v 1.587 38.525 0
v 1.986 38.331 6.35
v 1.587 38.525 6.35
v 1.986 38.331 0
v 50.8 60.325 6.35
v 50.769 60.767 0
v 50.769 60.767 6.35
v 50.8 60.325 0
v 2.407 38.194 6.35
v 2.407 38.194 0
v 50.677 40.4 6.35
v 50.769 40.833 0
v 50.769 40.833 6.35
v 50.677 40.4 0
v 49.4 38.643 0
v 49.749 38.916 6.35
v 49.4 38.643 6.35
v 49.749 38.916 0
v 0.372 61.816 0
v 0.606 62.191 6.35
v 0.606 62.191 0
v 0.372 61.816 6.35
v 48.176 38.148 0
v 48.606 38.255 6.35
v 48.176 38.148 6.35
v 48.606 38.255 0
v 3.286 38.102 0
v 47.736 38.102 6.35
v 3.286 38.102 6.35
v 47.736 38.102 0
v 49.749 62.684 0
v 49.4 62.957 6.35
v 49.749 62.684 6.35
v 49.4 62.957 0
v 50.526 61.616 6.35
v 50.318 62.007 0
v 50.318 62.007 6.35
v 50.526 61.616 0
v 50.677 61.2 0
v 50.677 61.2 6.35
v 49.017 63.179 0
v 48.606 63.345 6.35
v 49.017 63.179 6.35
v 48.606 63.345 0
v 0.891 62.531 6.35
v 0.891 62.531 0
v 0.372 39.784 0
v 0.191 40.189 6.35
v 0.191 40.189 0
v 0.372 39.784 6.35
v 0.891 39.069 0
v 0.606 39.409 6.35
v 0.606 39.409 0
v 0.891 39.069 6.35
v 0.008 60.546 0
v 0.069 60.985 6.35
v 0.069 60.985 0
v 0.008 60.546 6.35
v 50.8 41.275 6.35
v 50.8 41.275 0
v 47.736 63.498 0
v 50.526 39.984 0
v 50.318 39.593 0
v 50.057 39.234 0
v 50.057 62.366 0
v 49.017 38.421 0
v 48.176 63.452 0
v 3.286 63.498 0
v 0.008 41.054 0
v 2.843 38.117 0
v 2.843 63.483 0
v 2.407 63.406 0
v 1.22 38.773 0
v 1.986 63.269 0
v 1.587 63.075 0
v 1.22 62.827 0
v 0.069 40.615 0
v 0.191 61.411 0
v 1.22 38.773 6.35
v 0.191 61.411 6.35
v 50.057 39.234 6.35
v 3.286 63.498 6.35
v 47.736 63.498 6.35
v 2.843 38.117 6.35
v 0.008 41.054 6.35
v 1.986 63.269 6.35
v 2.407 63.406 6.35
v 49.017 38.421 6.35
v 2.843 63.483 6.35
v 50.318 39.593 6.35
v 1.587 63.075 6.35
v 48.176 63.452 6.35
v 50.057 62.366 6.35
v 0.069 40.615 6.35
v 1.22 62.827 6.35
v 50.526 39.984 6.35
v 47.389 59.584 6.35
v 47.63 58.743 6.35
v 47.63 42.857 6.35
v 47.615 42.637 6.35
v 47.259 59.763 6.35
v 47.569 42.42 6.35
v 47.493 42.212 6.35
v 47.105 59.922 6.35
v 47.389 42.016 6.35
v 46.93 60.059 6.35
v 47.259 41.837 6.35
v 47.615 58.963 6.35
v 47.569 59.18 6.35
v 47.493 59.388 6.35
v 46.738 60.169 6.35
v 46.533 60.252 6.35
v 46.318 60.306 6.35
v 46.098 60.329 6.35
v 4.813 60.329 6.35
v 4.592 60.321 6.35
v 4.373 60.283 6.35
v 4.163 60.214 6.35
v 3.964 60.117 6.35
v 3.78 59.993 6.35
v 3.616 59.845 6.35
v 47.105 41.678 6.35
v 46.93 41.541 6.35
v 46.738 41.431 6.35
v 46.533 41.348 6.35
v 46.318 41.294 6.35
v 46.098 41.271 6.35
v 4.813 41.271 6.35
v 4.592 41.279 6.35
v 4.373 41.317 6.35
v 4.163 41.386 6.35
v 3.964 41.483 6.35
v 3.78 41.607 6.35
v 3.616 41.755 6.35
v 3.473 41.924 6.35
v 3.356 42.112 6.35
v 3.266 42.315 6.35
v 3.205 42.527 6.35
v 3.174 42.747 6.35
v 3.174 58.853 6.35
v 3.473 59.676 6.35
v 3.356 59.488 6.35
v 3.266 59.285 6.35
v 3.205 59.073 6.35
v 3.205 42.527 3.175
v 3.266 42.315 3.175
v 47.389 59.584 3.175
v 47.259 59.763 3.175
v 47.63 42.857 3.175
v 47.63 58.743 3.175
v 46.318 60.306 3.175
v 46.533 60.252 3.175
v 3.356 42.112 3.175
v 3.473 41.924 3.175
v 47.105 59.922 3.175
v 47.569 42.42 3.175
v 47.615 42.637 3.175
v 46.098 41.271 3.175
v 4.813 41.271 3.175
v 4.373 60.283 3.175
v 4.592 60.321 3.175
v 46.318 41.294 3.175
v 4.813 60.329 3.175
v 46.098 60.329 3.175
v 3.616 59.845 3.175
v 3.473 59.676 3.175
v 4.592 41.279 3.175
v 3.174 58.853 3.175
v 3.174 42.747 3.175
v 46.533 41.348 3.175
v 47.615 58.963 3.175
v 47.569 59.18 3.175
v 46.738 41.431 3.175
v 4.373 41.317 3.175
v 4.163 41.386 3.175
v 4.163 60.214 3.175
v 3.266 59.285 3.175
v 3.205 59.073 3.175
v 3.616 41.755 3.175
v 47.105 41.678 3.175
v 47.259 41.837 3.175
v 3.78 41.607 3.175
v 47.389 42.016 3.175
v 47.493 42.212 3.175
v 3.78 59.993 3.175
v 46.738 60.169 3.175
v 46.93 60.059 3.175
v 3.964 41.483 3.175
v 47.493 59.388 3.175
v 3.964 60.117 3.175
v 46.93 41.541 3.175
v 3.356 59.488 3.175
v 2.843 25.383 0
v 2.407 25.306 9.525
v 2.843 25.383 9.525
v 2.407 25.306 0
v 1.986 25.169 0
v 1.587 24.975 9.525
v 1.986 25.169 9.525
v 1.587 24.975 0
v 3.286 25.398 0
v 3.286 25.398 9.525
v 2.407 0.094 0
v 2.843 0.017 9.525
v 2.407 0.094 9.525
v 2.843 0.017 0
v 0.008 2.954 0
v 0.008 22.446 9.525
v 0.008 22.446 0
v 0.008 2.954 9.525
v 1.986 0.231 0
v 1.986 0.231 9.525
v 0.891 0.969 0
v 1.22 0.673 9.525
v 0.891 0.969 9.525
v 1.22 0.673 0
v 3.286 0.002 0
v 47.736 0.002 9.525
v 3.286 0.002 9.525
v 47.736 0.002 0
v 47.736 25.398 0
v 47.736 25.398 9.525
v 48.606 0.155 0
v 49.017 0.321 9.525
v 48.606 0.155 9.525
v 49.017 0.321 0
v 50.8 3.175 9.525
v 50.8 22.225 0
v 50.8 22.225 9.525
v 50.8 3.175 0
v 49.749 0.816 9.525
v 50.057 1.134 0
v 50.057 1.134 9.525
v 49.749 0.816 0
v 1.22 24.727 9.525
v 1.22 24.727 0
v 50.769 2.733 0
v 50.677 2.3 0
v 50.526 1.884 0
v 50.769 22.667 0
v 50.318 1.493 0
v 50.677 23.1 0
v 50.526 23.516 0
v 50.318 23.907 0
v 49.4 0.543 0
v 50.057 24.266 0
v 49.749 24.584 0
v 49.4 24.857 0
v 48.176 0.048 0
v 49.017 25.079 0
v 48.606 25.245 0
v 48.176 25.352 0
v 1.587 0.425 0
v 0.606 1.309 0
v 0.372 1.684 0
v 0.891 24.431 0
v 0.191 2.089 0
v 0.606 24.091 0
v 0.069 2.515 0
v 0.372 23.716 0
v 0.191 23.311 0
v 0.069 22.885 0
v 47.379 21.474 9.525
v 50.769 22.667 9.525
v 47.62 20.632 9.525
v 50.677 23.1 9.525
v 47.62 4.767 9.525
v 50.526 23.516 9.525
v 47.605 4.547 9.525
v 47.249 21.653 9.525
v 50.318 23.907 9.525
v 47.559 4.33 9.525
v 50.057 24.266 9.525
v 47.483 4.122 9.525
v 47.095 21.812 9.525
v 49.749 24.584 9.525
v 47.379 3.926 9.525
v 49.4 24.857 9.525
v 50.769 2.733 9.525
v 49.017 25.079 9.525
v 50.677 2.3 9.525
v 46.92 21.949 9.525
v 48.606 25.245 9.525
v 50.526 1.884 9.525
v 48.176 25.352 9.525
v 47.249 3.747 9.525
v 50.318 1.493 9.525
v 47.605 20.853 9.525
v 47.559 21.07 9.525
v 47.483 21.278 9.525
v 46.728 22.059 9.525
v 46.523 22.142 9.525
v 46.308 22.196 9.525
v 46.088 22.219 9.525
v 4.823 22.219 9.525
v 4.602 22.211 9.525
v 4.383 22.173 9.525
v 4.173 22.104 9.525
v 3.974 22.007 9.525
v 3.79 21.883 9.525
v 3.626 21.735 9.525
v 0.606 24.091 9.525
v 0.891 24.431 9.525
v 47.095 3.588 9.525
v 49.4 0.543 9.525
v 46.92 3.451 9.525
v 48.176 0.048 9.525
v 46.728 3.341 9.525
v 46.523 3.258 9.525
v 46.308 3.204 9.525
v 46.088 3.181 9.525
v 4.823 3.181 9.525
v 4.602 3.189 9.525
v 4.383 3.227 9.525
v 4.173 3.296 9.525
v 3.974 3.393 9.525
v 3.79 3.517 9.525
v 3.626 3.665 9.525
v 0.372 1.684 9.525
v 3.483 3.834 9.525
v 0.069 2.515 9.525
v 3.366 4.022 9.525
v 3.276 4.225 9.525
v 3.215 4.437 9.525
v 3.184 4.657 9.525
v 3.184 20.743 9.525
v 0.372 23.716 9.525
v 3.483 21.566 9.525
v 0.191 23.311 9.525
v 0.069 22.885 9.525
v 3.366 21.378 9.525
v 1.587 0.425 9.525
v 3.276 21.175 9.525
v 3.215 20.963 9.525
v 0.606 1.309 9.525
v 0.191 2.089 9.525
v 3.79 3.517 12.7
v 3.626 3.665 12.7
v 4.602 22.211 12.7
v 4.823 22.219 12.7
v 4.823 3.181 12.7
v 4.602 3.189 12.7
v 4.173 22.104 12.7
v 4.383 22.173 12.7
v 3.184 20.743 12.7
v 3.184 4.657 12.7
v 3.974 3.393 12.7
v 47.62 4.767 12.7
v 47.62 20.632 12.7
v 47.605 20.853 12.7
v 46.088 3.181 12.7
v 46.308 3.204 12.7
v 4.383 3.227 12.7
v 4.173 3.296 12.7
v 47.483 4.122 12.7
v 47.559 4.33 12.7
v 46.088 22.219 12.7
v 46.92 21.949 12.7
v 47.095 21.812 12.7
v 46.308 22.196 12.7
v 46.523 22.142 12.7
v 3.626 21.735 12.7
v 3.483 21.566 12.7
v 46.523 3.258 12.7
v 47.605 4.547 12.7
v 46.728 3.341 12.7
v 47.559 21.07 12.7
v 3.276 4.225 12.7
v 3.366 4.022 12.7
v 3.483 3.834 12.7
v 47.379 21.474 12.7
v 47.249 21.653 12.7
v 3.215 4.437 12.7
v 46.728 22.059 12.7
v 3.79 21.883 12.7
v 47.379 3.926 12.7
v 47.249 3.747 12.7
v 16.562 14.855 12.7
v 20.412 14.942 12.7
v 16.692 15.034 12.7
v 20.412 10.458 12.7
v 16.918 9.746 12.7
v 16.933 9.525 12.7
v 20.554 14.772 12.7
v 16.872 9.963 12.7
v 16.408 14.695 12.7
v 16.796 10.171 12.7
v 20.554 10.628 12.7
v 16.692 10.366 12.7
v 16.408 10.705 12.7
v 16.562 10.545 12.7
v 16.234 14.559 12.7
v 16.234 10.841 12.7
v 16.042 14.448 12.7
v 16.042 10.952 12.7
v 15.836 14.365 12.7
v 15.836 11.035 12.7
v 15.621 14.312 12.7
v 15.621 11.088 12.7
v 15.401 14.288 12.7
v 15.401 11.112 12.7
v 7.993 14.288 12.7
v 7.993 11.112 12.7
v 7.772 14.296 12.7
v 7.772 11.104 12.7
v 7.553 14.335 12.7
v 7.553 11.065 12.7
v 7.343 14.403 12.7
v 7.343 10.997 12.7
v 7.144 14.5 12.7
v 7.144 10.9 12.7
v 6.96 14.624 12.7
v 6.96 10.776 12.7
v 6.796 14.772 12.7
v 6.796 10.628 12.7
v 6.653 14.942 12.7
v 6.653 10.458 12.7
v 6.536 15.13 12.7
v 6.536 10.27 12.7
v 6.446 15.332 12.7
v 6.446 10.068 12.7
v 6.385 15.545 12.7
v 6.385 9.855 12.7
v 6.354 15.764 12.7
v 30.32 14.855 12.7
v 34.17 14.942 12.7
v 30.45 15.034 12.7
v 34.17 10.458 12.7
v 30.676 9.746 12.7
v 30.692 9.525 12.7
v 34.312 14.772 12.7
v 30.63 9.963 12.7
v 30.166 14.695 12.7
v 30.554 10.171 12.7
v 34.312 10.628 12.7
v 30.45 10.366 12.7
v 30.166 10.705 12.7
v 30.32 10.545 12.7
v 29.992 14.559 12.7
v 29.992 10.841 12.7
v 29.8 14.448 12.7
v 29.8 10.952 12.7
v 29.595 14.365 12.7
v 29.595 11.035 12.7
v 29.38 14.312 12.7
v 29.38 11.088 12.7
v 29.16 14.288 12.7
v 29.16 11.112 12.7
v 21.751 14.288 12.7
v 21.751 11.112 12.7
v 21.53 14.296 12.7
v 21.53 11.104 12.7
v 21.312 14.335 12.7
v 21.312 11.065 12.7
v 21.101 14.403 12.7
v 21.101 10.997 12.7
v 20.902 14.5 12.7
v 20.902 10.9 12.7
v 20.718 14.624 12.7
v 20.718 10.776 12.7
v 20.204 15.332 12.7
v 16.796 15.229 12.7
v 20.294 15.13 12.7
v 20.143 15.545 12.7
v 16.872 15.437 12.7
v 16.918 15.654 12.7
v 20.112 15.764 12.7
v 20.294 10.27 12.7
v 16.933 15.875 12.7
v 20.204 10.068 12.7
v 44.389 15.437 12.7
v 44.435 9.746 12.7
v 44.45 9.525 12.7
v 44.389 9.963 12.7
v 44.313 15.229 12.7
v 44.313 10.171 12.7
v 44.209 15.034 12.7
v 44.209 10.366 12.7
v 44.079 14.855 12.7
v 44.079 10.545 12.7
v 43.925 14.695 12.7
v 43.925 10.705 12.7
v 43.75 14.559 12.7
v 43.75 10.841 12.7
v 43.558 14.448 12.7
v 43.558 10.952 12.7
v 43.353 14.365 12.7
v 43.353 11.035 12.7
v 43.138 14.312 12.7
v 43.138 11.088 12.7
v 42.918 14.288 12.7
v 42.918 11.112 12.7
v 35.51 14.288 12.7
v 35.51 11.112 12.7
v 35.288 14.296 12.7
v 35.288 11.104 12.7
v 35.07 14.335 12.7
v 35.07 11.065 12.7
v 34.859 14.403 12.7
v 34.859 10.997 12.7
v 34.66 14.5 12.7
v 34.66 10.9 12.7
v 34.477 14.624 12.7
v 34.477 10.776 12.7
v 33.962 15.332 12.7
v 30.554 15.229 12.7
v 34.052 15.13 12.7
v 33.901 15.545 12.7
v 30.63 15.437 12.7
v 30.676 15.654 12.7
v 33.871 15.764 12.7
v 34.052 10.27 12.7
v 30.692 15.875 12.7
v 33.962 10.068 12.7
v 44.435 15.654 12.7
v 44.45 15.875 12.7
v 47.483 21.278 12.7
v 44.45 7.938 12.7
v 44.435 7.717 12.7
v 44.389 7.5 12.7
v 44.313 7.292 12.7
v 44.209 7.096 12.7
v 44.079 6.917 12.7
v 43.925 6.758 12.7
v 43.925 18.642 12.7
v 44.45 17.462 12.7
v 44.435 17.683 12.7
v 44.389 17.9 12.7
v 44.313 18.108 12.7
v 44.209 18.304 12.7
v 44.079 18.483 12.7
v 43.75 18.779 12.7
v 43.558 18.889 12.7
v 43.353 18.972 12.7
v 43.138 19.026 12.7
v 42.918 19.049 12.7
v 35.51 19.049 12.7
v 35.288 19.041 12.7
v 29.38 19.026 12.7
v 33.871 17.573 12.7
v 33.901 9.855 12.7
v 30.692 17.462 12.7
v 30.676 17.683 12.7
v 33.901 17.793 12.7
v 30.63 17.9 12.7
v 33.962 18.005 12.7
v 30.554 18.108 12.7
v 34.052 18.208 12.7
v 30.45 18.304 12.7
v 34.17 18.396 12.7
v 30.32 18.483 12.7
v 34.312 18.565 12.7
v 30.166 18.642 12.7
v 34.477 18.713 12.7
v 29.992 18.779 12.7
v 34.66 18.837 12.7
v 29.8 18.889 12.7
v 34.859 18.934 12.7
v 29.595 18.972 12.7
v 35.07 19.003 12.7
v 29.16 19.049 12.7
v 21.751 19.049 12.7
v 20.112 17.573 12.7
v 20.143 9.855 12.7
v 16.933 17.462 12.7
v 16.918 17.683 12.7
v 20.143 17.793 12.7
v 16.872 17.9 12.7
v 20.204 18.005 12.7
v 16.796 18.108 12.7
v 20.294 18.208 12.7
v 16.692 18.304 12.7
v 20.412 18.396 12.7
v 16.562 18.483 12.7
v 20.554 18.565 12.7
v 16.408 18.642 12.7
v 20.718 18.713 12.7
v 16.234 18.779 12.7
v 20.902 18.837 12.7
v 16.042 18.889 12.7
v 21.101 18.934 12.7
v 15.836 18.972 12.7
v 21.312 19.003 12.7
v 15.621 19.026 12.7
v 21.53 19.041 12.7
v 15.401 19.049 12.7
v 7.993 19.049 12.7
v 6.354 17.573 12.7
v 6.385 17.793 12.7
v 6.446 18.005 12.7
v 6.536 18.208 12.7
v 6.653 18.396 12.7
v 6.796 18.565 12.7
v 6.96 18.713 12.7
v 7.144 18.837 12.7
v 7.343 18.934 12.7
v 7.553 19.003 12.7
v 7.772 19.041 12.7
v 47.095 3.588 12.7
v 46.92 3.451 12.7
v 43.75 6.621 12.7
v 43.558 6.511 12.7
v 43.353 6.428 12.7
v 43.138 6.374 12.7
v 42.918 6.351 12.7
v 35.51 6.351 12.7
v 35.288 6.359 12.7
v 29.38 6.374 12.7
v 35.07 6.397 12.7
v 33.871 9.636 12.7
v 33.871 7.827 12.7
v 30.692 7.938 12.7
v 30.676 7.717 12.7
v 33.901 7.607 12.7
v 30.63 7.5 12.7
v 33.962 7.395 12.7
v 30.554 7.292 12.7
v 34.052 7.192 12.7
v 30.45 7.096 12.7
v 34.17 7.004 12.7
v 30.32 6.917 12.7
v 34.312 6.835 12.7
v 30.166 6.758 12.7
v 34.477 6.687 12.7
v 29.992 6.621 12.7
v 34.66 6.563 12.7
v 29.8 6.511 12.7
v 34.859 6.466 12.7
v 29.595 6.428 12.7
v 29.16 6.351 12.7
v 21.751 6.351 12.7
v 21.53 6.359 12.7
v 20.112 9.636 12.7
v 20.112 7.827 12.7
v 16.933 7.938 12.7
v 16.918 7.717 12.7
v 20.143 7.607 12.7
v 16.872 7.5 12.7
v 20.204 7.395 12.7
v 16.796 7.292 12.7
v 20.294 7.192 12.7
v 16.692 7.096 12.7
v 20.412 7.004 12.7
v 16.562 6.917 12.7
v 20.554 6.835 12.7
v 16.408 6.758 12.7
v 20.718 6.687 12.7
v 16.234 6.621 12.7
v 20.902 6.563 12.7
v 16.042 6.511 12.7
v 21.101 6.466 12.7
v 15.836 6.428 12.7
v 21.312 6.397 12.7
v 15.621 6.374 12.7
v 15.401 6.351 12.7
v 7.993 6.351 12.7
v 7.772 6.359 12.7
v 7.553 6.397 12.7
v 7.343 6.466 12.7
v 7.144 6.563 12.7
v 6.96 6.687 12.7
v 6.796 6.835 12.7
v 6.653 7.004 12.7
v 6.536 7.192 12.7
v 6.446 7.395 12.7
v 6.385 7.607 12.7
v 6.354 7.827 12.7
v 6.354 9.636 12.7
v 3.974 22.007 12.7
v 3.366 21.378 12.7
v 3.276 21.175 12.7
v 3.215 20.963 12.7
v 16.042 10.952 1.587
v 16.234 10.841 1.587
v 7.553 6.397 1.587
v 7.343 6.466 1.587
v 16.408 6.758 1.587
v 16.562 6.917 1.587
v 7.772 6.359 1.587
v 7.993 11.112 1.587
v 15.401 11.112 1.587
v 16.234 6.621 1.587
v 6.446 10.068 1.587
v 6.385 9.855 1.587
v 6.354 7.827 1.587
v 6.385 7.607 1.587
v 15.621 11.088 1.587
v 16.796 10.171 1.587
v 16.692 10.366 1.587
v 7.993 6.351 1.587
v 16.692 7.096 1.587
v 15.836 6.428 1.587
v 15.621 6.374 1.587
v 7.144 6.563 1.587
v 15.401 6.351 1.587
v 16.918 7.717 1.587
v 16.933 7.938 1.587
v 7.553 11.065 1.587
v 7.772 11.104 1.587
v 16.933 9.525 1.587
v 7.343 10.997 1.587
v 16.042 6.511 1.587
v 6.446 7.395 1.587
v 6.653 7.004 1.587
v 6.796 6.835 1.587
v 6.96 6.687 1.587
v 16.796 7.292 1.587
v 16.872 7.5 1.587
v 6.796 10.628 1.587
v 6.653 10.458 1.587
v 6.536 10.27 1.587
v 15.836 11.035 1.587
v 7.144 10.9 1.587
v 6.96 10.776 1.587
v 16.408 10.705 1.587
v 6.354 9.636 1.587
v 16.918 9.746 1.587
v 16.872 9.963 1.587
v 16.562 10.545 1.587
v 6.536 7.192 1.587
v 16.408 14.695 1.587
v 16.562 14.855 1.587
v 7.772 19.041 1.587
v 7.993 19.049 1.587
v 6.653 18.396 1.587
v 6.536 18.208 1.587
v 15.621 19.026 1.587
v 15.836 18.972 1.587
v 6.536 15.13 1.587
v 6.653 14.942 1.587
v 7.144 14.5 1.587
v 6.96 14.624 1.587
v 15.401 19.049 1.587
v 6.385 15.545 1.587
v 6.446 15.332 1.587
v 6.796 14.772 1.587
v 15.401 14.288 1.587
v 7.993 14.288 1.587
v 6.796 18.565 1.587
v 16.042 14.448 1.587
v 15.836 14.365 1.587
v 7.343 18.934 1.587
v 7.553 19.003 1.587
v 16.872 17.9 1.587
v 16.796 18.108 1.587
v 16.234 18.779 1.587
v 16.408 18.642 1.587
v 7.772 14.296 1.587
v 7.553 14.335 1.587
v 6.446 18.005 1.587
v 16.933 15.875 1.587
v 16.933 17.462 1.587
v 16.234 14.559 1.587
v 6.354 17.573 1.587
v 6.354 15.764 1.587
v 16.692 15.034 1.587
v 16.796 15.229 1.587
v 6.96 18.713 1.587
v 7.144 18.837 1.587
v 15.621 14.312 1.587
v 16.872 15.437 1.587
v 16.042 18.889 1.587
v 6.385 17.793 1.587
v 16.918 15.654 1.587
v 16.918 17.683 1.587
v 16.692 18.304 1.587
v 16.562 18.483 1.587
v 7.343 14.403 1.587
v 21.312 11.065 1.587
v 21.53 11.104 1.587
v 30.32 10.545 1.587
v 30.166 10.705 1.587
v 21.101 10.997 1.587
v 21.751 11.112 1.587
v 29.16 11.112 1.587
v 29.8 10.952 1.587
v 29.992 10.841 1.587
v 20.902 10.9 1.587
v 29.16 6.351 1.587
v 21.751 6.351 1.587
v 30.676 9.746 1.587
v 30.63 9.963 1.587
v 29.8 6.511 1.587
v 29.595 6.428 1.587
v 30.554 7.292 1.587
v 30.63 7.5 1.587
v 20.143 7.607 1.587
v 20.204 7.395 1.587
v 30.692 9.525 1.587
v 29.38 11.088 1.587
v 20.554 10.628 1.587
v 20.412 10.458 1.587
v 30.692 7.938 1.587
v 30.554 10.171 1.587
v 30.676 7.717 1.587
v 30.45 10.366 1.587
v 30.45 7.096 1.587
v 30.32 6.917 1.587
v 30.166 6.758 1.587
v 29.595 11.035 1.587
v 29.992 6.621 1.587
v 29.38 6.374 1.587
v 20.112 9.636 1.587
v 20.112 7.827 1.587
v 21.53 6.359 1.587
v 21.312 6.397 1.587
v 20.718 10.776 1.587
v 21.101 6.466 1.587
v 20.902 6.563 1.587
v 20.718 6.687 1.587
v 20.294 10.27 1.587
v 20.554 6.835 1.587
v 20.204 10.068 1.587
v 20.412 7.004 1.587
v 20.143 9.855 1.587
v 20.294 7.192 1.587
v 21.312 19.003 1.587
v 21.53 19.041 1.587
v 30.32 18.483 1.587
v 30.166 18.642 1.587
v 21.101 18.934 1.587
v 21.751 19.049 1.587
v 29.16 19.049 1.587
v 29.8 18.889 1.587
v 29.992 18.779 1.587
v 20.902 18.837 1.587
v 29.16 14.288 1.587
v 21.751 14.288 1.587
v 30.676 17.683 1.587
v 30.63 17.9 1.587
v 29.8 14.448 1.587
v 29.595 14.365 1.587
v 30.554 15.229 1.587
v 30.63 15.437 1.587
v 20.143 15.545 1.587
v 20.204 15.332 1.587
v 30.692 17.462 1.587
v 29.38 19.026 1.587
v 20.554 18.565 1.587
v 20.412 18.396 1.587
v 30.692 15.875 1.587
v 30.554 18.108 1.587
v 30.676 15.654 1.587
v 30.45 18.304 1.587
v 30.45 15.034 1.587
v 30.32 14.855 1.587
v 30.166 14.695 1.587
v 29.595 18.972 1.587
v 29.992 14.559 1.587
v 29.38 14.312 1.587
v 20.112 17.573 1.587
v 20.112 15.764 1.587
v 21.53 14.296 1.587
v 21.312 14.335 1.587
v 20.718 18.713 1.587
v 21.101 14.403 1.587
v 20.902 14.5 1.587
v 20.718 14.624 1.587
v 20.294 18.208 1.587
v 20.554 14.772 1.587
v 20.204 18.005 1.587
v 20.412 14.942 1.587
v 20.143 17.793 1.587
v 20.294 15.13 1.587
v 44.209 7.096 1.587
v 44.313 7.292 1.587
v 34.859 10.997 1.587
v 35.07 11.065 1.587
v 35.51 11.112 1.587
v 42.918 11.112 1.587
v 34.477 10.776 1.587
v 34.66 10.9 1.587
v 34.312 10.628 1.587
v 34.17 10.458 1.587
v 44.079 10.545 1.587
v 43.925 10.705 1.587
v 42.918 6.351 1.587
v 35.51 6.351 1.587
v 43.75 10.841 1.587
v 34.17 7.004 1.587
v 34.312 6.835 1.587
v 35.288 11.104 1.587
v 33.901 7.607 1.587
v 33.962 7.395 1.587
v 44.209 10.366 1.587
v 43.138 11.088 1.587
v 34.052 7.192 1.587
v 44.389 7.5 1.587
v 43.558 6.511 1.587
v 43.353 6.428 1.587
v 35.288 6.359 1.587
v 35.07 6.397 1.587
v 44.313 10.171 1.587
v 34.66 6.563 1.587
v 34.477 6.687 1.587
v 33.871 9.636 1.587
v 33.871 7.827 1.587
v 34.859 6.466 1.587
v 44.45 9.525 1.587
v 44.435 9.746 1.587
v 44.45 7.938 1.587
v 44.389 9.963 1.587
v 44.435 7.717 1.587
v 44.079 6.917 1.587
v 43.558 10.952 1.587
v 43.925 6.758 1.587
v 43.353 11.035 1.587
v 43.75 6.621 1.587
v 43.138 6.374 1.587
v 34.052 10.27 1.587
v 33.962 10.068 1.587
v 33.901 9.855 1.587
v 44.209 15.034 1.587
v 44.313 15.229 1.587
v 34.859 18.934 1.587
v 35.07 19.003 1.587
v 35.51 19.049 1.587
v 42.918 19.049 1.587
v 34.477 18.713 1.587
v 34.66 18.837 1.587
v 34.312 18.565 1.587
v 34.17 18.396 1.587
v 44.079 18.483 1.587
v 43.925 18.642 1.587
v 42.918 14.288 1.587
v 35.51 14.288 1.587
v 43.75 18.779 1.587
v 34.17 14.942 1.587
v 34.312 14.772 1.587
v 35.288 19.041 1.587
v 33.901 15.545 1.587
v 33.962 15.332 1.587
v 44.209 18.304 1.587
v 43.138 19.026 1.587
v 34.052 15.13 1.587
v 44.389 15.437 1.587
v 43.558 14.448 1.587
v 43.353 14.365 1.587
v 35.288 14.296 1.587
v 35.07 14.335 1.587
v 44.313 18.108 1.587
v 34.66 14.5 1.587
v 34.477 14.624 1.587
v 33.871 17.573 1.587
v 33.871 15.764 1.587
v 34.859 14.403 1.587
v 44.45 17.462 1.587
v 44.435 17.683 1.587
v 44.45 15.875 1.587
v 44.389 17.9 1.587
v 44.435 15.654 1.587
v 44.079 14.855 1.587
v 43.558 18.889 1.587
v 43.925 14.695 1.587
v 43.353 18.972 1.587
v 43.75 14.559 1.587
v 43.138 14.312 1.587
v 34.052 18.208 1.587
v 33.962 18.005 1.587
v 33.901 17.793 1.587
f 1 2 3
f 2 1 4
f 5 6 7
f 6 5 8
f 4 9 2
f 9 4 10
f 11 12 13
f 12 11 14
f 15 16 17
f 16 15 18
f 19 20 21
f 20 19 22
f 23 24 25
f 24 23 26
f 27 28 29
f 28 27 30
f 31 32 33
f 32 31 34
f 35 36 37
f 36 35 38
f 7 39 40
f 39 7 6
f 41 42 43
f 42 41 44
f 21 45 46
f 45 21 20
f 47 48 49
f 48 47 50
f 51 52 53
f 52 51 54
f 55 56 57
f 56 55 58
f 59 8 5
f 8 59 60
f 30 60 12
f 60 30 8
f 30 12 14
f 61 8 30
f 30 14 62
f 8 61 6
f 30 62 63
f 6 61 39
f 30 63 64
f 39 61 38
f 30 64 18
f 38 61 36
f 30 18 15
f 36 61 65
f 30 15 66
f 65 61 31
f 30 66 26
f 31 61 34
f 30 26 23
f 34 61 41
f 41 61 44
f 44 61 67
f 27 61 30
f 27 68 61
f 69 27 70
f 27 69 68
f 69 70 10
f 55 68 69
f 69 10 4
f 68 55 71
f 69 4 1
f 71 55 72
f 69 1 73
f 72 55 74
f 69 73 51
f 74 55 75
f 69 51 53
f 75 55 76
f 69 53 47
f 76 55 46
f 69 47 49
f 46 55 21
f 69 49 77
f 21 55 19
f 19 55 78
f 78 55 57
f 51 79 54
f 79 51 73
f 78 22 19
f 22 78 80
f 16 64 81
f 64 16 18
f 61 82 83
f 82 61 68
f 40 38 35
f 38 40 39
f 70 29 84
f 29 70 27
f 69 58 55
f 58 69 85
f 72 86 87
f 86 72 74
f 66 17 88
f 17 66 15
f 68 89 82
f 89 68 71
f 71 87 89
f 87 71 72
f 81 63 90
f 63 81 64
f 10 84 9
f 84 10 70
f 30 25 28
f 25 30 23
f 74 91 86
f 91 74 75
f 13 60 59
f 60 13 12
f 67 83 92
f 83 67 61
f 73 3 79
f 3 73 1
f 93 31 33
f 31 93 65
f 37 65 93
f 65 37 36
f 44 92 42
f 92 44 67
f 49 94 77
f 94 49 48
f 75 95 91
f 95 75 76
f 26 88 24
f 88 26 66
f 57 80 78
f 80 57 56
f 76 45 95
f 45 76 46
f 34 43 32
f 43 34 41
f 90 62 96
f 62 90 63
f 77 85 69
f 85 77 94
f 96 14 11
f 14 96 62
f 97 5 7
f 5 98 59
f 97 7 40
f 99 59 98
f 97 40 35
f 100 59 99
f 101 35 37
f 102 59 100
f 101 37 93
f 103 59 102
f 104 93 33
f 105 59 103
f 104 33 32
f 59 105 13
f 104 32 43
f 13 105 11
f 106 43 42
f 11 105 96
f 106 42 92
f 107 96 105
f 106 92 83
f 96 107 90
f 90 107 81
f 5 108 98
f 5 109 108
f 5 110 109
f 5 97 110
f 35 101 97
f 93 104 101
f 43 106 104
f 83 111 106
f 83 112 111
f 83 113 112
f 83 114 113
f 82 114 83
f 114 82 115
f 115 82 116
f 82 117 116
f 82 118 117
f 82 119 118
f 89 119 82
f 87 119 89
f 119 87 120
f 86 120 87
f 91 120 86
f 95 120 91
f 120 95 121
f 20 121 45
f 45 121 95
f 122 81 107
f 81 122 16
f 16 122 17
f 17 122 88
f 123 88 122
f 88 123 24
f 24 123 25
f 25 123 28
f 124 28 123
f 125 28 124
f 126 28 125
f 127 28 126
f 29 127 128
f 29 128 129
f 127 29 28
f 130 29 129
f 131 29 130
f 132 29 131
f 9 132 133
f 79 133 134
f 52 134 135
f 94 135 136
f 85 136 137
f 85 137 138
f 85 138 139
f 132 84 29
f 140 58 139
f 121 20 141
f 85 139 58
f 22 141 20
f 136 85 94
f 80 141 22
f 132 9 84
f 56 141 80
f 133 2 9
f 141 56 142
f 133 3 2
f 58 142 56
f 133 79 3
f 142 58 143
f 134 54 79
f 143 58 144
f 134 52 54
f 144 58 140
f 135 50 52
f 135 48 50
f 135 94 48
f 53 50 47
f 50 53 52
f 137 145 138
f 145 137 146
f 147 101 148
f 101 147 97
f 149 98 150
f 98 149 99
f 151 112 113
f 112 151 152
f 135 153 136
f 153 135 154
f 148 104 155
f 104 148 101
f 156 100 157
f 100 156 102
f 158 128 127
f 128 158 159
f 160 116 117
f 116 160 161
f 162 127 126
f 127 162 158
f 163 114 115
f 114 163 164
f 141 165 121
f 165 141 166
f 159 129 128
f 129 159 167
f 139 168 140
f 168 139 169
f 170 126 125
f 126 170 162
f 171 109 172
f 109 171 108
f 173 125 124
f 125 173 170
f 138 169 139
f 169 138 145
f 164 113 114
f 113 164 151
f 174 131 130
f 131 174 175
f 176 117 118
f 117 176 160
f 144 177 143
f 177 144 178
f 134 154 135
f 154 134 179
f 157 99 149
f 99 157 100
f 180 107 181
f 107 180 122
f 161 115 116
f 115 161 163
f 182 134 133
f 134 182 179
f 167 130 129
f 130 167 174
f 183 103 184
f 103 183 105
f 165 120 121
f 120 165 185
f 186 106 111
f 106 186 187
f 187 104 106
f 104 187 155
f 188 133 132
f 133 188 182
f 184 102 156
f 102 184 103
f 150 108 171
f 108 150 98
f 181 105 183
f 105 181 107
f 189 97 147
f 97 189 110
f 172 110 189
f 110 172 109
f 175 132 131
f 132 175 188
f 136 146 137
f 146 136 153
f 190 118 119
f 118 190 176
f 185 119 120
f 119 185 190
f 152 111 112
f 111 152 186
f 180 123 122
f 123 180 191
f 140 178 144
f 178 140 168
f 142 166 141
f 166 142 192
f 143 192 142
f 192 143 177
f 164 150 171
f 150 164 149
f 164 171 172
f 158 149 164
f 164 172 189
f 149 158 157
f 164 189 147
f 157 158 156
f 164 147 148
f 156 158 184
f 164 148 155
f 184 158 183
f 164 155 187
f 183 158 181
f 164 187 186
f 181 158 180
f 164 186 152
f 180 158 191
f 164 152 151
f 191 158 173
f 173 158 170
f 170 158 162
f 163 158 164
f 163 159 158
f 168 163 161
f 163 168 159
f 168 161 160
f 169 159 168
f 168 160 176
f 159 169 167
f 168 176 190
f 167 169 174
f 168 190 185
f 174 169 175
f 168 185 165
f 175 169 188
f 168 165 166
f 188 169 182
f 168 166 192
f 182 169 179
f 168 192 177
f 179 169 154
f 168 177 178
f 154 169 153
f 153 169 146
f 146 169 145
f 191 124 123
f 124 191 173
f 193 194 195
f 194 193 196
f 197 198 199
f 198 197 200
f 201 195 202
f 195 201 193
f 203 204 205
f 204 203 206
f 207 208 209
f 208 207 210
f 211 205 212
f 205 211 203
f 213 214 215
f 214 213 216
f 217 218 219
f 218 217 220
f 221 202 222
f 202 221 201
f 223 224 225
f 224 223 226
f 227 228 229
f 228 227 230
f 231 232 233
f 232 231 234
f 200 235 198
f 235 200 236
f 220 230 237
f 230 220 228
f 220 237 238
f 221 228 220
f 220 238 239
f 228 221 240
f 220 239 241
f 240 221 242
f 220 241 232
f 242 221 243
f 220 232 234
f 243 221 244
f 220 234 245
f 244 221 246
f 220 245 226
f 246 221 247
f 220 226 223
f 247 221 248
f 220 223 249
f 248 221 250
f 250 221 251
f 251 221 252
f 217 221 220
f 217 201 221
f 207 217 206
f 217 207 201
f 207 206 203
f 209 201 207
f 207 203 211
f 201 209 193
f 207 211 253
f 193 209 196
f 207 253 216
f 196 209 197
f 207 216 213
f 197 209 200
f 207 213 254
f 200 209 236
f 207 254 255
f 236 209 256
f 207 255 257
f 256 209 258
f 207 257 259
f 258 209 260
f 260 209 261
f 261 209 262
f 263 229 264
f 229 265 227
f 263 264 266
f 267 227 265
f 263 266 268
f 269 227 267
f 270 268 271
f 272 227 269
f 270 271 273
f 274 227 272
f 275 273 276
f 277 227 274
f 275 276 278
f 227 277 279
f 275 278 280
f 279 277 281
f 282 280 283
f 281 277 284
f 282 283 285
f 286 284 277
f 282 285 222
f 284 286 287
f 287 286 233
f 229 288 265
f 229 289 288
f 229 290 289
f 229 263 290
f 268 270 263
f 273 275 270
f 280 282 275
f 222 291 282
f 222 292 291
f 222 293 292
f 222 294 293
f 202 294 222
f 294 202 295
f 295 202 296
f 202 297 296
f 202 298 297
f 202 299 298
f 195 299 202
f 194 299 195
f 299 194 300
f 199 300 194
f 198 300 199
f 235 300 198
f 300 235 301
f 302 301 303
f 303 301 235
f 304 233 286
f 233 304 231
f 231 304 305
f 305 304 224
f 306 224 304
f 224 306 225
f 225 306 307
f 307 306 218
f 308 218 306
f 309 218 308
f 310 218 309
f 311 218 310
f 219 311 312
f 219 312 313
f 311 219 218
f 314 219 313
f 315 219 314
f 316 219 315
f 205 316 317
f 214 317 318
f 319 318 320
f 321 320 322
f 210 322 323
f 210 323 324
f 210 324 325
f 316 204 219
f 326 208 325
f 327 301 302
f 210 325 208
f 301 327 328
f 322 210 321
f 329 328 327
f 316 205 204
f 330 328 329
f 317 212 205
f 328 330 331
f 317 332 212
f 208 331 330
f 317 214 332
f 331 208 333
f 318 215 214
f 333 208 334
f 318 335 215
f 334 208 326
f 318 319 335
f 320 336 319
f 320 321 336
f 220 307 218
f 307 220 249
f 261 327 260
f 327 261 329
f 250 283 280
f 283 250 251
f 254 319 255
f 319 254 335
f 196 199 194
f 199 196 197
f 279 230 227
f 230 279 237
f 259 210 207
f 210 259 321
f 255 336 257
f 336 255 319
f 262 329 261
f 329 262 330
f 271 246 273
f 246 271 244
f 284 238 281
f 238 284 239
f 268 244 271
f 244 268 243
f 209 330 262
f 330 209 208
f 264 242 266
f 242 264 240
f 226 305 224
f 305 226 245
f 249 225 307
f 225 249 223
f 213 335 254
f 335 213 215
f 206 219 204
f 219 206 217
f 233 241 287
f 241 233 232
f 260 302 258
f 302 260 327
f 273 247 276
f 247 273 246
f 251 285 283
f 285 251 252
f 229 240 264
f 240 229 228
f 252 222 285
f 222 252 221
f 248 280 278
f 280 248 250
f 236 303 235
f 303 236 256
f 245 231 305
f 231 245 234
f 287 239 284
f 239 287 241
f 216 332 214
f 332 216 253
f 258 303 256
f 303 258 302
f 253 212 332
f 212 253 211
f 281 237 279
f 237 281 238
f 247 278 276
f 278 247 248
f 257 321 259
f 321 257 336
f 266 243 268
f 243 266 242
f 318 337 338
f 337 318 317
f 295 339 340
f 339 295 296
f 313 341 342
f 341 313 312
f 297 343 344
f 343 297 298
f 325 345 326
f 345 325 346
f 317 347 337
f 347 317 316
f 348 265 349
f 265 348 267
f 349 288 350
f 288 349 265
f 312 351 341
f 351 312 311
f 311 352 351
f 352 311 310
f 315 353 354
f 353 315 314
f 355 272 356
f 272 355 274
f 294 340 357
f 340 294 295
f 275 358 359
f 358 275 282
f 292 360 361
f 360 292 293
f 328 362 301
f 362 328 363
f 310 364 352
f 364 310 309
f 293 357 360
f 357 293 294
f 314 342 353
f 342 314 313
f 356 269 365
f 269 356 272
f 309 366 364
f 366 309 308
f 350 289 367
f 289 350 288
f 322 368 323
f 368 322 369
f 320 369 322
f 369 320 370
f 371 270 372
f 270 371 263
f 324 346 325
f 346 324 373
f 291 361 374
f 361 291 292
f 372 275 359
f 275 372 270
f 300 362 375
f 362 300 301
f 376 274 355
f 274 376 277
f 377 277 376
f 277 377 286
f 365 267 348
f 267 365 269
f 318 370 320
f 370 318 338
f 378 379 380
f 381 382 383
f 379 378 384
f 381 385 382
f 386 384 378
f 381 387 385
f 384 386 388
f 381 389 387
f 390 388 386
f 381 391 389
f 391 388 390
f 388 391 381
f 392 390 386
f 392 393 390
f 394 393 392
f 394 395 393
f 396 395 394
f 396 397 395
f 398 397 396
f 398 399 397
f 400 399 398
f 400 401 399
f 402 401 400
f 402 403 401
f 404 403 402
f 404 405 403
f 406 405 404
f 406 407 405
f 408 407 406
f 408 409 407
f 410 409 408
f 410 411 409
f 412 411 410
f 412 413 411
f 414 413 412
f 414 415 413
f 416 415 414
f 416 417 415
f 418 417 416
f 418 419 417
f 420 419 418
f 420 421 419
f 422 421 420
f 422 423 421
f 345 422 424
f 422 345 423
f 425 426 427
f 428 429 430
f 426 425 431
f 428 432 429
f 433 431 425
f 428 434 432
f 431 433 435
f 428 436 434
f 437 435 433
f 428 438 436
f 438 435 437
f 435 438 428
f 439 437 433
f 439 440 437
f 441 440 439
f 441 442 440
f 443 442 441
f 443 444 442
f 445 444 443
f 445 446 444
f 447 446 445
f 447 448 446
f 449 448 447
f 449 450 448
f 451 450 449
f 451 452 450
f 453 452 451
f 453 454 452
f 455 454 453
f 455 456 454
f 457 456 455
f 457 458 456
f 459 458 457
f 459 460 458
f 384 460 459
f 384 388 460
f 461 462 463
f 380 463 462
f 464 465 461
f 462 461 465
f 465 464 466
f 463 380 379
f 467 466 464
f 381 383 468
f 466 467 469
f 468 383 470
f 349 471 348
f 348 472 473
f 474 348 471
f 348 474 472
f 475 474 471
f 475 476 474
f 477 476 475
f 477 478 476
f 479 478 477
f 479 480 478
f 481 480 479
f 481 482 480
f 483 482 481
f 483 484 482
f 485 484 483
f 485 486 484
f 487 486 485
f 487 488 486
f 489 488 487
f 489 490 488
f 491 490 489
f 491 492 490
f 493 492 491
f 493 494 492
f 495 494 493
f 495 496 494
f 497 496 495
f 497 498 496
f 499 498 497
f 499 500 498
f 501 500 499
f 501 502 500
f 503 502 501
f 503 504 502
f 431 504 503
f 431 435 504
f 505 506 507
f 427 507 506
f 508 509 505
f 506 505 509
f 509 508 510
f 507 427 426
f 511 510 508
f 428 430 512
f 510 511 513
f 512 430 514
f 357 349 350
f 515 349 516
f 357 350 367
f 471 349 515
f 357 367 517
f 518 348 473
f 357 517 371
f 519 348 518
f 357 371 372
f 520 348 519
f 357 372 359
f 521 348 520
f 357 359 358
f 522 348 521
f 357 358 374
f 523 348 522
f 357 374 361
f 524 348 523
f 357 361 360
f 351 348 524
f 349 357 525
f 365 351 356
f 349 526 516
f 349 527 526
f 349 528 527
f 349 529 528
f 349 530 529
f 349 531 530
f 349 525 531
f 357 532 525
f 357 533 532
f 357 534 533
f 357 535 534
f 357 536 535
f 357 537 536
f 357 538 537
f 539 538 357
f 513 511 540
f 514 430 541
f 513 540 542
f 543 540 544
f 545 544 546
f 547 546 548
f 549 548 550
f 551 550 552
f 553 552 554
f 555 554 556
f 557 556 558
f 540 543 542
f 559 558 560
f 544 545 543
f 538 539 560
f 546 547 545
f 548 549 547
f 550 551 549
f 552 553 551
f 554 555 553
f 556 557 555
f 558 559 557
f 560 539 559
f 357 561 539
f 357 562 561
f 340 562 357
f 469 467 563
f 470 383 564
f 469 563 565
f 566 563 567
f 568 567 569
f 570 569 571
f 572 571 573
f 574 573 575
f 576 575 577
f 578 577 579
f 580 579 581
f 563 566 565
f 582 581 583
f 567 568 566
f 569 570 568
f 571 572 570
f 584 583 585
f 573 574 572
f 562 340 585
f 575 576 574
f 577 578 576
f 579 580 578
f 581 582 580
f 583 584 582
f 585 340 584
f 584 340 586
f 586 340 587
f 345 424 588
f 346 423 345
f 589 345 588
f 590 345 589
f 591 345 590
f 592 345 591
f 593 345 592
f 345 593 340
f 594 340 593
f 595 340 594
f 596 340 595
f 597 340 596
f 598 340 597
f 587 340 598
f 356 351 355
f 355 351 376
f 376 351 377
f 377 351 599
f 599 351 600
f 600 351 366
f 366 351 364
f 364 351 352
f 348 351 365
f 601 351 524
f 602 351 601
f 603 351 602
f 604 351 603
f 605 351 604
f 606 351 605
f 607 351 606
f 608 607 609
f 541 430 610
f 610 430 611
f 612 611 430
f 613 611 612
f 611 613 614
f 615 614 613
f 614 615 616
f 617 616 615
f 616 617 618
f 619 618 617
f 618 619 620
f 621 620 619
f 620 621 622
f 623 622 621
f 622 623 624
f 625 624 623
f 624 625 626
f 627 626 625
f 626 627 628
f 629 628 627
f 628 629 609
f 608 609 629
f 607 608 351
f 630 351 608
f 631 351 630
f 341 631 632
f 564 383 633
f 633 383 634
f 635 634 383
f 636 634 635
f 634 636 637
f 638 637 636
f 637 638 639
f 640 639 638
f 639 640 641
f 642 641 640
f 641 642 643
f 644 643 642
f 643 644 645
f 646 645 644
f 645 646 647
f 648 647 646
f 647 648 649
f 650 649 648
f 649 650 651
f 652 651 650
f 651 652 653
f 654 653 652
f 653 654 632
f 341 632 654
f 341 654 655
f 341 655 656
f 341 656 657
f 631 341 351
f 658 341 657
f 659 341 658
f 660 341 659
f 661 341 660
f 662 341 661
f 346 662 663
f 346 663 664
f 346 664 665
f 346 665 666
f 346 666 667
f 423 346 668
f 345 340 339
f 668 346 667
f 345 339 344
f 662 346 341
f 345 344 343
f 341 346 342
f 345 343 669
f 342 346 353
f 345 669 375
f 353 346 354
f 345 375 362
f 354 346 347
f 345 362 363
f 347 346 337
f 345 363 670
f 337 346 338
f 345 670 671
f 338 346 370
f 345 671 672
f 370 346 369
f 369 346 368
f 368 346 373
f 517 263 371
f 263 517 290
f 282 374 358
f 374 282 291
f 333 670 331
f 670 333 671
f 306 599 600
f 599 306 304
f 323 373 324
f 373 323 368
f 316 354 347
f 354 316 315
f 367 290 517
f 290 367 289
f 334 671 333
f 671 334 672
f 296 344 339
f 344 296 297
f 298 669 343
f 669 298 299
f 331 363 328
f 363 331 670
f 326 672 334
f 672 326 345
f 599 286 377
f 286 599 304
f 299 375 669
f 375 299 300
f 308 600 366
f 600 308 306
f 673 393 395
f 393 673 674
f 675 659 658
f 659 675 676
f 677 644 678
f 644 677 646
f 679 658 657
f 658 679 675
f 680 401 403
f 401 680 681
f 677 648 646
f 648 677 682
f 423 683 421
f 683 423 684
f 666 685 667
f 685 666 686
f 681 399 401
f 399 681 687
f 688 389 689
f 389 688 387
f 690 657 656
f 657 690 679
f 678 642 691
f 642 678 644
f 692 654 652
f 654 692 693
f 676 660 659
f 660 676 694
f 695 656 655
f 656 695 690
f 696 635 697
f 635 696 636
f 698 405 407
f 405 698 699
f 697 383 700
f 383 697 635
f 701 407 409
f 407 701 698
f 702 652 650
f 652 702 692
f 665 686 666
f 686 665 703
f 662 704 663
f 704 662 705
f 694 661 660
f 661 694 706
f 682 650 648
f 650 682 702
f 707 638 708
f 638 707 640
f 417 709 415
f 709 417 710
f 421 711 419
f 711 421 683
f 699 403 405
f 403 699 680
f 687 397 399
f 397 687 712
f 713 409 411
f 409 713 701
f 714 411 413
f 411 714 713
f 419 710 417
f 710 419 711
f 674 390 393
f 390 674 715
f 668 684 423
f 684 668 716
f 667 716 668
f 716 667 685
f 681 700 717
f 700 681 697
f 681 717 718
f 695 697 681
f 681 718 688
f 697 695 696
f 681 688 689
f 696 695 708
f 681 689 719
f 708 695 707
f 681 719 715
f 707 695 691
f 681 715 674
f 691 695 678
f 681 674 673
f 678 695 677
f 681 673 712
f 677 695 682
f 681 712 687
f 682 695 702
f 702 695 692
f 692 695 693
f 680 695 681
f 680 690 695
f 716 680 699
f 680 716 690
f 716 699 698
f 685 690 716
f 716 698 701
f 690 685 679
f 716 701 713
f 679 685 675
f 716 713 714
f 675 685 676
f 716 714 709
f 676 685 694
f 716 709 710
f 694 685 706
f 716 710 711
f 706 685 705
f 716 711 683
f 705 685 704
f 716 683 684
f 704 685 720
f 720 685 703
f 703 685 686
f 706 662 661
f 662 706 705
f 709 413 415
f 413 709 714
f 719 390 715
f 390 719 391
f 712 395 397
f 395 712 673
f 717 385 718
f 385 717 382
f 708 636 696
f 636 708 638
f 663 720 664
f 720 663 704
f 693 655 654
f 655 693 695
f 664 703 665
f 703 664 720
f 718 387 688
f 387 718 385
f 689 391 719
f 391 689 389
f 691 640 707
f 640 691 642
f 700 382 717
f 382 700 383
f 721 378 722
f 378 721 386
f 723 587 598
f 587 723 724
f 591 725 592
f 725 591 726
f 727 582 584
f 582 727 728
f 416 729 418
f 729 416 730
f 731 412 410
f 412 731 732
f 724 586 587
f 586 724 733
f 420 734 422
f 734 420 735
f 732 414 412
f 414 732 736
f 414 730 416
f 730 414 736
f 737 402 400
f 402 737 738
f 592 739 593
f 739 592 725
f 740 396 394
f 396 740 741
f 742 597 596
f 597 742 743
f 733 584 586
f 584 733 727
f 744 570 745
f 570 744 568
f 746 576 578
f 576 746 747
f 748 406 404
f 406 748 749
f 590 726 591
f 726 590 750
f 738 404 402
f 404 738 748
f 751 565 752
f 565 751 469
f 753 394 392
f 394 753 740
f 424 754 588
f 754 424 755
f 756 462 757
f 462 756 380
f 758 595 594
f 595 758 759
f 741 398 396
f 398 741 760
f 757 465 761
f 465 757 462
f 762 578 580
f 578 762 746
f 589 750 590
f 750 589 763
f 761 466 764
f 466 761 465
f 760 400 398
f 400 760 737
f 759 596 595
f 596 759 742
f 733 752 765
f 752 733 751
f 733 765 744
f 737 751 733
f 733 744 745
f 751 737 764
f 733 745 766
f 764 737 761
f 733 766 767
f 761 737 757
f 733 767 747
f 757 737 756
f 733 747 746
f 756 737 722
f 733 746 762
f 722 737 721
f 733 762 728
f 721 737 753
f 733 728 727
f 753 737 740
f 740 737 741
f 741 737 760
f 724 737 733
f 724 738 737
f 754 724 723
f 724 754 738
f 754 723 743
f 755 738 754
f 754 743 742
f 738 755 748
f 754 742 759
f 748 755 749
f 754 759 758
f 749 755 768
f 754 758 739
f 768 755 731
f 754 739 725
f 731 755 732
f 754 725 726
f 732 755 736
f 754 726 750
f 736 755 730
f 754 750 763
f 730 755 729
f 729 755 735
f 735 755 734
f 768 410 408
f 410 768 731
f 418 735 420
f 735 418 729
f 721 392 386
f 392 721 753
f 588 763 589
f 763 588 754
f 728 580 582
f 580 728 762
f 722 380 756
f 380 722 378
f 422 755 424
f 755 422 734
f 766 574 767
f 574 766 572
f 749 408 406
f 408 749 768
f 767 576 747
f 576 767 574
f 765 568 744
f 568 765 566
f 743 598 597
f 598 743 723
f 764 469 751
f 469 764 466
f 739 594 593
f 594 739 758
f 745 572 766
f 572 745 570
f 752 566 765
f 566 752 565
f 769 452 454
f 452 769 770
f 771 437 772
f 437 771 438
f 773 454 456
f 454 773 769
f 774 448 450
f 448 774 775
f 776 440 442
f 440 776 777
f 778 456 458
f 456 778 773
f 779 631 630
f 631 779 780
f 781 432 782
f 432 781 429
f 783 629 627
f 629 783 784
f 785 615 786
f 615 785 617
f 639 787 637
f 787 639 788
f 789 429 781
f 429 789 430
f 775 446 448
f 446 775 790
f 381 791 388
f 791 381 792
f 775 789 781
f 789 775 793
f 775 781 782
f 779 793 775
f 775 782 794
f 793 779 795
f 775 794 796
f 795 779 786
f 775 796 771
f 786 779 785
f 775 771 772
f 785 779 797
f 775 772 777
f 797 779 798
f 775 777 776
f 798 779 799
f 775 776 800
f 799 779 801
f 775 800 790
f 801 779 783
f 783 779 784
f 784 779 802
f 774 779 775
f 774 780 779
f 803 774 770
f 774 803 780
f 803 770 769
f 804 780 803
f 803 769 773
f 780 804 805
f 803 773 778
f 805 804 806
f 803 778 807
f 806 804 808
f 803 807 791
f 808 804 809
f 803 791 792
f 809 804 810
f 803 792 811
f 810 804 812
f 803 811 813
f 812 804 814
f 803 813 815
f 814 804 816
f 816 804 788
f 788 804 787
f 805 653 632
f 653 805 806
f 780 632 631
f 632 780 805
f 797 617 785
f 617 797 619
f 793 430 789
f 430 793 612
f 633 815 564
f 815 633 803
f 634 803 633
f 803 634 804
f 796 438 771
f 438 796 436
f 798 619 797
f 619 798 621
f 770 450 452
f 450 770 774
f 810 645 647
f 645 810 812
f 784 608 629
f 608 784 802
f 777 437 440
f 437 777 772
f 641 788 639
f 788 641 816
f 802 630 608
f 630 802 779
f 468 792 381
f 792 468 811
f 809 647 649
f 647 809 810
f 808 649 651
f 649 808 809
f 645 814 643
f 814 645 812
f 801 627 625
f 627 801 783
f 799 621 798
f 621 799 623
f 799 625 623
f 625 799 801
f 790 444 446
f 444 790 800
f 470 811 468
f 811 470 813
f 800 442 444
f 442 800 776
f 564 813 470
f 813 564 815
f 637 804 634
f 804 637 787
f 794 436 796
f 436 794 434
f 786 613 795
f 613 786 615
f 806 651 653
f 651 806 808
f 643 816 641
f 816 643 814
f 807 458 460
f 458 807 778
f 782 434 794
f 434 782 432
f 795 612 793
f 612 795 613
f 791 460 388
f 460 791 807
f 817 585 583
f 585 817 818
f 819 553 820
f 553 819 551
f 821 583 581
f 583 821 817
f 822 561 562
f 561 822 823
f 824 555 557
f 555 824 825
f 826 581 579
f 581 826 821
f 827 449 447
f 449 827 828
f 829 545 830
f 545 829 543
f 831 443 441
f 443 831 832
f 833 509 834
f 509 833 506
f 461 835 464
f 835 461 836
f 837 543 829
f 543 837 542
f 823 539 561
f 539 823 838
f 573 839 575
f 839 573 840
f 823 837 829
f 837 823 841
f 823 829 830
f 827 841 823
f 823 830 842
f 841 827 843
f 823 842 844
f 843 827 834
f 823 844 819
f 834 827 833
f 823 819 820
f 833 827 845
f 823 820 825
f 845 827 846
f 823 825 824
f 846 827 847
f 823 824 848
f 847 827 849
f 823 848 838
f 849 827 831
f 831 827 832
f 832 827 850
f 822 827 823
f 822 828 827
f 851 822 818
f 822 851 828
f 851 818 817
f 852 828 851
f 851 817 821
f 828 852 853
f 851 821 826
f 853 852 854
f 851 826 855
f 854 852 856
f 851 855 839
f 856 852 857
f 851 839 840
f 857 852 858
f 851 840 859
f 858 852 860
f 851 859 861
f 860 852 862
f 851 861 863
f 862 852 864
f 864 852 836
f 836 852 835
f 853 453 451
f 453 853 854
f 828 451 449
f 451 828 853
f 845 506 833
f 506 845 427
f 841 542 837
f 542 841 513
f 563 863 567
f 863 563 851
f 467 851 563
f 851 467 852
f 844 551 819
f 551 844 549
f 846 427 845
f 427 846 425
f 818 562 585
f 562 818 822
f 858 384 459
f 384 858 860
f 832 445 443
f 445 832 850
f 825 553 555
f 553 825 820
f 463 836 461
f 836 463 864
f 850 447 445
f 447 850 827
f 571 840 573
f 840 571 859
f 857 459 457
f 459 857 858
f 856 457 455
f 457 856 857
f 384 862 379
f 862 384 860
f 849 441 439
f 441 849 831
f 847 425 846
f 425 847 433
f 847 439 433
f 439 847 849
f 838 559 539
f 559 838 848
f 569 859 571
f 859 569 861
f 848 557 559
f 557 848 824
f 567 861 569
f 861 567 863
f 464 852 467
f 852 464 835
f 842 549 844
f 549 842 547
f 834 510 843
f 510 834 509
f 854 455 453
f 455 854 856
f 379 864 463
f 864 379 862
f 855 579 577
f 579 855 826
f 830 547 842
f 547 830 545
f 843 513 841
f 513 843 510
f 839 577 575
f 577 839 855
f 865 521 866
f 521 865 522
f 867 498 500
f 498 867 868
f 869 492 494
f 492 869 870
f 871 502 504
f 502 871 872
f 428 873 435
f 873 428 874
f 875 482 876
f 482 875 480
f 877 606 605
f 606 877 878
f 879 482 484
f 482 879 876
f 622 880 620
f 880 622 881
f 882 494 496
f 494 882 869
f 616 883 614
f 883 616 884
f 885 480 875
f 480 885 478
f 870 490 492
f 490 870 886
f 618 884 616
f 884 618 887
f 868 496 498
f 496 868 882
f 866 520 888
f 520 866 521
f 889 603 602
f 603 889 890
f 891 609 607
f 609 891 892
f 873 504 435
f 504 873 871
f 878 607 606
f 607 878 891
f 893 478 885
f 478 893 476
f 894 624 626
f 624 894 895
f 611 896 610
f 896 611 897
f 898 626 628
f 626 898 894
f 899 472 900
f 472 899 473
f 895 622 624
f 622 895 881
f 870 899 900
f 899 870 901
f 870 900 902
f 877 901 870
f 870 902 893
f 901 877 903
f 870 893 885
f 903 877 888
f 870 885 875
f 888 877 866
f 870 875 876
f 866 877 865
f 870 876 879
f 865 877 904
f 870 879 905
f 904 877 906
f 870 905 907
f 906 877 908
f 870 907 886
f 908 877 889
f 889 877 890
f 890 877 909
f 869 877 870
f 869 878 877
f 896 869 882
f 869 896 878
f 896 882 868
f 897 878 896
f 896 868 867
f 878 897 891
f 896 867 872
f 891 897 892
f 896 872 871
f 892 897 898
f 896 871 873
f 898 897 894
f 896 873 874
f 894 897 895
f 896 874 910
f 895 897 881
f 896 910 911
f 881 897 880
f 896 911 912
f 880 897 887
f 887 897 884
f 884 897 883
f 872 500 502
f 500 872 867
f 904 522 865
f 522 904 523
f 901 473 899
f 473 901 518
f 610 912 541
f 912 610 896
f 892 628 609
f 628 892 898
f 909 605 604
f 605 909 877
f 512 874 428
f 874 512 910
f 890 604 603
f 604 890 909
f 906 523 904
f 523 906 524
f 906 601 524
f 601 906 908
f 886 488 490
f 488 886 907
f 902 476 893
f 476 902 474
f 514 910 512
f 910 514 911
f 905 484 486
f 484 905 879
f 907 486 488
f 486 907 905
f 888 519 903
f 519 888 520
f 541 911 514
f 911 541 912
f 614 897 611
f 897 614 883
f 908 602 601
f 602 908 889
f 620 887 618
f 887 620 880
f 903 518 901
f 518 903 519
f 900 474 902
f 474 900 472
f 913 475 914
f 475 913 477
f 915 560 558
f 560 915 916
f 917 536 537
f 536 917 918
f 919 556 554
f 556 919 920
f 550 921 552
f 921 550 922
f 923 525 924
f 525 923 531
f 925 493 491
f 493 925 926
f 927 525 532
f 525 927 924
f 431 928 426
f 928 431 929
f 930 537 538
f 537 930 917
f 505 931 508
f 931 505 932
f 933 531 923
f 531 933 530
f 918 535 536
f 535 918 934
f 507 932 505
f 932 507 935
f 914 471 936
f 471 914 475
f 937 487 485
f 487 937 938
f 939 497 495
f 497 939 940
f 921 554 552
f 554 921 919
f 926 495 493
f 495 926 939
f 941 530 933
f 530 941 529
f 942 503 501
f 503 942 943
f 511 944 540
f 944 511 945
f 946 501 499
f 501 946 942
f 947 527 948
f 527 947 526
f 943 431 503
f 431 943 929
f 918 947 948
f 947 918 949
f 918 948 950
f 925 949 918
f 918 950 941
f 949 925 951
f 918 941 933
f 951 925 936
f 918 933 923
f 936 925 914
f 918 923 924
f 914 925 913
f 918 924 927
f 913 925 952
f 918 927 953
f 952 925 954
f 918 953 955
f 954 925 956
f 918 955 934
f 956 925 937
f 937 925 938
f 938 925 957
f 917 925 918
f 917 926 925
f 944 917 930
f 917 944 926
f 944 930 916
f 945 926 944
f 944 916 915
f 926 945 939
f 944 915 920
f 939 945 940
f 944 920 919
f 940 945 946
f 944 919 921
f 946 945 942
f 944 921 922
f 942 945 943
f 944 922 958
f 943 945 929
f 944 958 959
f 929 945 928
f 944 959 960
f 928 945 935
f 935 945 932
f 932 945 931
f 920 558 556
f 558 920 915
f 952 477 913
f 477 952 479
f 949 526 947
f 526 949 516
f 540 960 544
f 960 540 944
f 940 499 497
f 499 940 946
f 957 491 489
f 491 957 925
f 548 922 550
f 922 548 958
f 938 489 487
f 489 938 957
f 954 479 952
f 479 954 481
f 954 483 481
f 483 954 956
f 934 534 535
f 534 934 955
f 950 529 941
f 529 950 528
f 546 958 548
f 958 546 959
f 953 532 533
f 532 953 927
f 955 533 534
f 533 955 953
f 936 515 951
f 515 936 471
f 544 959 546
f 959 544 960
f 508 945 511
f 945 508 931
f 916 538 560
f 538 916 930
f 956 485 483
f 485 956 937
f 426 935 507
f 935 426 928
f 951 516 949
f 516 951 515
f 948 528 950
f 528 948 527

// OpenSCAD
//!OpenSCAD
//
// Please use the Customizer to interact with this (if necessary, show it by clearing the checkbox in front of View | Hide Customizer), and close this Editor window.
// * [Overview] *
// Part
PARTNO = 0;// [0:All, 1:Top, 2:Bottom]

partspacing = 12.7;

$fn=45;

// Type of Corner
Boxshape = 0; //[1:Square, 0:Rounded]
Width = 50.8;
Length = 25.4;
Height = 12.7;
Thickness = 6.35;

/* [Dividers] */
// Thickness
dividers_thickness = 3.175;
// Number of dividers widthwise
dividers_widthwise = 2;
// Number of dividers lengthwise
dividers_lengthwise = 1;
// Large Compartment
largecompartment = 0;// [0:None,1:Lengthwise, 2:Widthwise, 0:None]

/* [Endmill Parameters] */
// Shape
endmillshape = 1;// [0:Ball, 1:Square]
diameter = 3.175;
depth = 25.4;

Clearance = 0.01;
module endmillcut(emcshape, emcdiameter, emcdepth) {
  emcshape = emcshape;
  emcdiameter = emcdiameter;
  emcdepth = emcdepth;
  emcradius = emcdiameter / 2;
  if (emcshape == 0) {
    emcadjdepth = emcdepth - emcradius;
    union(){
      translate([0, 0, emcradius]){
        sphere(r=emcradius);
      }
      translate([0, 0, emcradius]){
        cylinder(r1=emcradius, r2=emcradius, h=emcadjdepth, center=false);
      }
    }
  } else if (emcshape == 1) {
    translate([0, 0, 0]){
      cylinder(r1=emcradius, r2=emcradius, h=emcdepth, center=false);
    }
  }

}

module fittedbox() {
  if (PARTNO == 1) {
    lid();
  } else if (PARTNO == 2) {
    box();
  } else {
    union(){
      lid();
      box();
    }
  }

}

module lid() {
  translate([0, (Length + partspacing), 0]){
    difference() {
      if (Boxshape == 0) {
        pocketrect(0, 0, 0, 1, Thickness, Length, Width, Thickness);
      } else {
        cube([Width, Length, Thickness], center=false);
      }

      pocketrect(Thickness / 2 - halfclearance, Thickness / 2 - halfclearance, halfthickness, 1, halfthickness, (Length - Thickness) + halfclearance * 2, (Width - Thickness) + halfclearance * 2, Height);
    }
  }
}

module pocketrect(px, py, pbottom, endmillshape, pdiameter, plength, pwidth, pdepth) {
  pradius = pdiameter / 2;
  translate([px, py, pbottom]){
    hull(){
      translate([pradius, pradius, 0]){
        endmillcut(endmillshape, pdiameter, pdepth);
      }
      translate([(pwidth - pradius), pradius, 0]){
        endmillcut(endmillshape, pdiameter, pdepth);
      }
      translate([(pwidth - pradius), (plength - pradius), 0]){
        endmillcut(endmillshape, pdiameter, pdepth);
      }
      translate([pradius, (plength - pradius), 0]){
        endmillcut(endmillshape, pdiameter, pdepth);
      }
    }
  }
}

module box() {
  difference() {
    union(){
      if (Boxshape == 0) {
        pocketrect(0, 0, 0, 1, Thickness, Length, Width, Height - halfthickness);
      } else {
        cube([Width, Length, (Height - halfthickness)], center=false);
      }

      pocketrect(Thickness / 2 + halfclearance, Thickness / 2 + halfclearance, halfthickness, 1, halfthickness, (Length - Thickness) - halfclearance * 2, (Width - Thickness) - halfclearance * 2, Height - halfthickness);
    }

    for (i = [0 : abs(1) : dividers_widthwise]) {
      for (j = [0 : abs(1) : dividers_lengthwise]) {
        if (largecompartment == 1 && (i % 2 == 1 && j == 0)) {
          pocketrect((Thickness + pcwidth * i) + dividers_thickness * (i + 0), (Thickness + pclength * j) + dividers_thickness * (j + 0), radius, endmillshape, diameter, intlength, pcwidth, Height);
        } else if (largecompartment == 2 && (j % 2 == 0 && i == 0)) {
          pocketrect((Thickness + pcwidth * i) + dividers_thickness * (i + 0), (Thickness + pclength * j) + dividers_thickness * (j + 0), radius, endmillshape, diameter, pclength, intwidth, Height);
        } else {
          pocketrect((Thickness + pcwidth * i) + dividers_thickness * (i + 0), (Thickness + pclength * j) + dividers_thickness * (j + 0), radius, endmillshape, diameter, pclength, pcwidth, Height);
        }

      }

    }

  }
}

halfthickness = Thickness / 2;
quarterthickness = Thickness / 4;
radius = diameter / 2;
adjdepth = depth - radius;
intwidth = Width - Thickness * 2;
intlength = Length - Thickness * 2;
pcwidth = (intwidth - dividers_thickness * dividers_widthwise) / (dividers_widthwise + 1);
pclength = (intlength - dividers_thickness * dividers_lengthwise) / (dividers_lengthwise + 1);
halfclearance = Clearance / 2;

fittedbox();
